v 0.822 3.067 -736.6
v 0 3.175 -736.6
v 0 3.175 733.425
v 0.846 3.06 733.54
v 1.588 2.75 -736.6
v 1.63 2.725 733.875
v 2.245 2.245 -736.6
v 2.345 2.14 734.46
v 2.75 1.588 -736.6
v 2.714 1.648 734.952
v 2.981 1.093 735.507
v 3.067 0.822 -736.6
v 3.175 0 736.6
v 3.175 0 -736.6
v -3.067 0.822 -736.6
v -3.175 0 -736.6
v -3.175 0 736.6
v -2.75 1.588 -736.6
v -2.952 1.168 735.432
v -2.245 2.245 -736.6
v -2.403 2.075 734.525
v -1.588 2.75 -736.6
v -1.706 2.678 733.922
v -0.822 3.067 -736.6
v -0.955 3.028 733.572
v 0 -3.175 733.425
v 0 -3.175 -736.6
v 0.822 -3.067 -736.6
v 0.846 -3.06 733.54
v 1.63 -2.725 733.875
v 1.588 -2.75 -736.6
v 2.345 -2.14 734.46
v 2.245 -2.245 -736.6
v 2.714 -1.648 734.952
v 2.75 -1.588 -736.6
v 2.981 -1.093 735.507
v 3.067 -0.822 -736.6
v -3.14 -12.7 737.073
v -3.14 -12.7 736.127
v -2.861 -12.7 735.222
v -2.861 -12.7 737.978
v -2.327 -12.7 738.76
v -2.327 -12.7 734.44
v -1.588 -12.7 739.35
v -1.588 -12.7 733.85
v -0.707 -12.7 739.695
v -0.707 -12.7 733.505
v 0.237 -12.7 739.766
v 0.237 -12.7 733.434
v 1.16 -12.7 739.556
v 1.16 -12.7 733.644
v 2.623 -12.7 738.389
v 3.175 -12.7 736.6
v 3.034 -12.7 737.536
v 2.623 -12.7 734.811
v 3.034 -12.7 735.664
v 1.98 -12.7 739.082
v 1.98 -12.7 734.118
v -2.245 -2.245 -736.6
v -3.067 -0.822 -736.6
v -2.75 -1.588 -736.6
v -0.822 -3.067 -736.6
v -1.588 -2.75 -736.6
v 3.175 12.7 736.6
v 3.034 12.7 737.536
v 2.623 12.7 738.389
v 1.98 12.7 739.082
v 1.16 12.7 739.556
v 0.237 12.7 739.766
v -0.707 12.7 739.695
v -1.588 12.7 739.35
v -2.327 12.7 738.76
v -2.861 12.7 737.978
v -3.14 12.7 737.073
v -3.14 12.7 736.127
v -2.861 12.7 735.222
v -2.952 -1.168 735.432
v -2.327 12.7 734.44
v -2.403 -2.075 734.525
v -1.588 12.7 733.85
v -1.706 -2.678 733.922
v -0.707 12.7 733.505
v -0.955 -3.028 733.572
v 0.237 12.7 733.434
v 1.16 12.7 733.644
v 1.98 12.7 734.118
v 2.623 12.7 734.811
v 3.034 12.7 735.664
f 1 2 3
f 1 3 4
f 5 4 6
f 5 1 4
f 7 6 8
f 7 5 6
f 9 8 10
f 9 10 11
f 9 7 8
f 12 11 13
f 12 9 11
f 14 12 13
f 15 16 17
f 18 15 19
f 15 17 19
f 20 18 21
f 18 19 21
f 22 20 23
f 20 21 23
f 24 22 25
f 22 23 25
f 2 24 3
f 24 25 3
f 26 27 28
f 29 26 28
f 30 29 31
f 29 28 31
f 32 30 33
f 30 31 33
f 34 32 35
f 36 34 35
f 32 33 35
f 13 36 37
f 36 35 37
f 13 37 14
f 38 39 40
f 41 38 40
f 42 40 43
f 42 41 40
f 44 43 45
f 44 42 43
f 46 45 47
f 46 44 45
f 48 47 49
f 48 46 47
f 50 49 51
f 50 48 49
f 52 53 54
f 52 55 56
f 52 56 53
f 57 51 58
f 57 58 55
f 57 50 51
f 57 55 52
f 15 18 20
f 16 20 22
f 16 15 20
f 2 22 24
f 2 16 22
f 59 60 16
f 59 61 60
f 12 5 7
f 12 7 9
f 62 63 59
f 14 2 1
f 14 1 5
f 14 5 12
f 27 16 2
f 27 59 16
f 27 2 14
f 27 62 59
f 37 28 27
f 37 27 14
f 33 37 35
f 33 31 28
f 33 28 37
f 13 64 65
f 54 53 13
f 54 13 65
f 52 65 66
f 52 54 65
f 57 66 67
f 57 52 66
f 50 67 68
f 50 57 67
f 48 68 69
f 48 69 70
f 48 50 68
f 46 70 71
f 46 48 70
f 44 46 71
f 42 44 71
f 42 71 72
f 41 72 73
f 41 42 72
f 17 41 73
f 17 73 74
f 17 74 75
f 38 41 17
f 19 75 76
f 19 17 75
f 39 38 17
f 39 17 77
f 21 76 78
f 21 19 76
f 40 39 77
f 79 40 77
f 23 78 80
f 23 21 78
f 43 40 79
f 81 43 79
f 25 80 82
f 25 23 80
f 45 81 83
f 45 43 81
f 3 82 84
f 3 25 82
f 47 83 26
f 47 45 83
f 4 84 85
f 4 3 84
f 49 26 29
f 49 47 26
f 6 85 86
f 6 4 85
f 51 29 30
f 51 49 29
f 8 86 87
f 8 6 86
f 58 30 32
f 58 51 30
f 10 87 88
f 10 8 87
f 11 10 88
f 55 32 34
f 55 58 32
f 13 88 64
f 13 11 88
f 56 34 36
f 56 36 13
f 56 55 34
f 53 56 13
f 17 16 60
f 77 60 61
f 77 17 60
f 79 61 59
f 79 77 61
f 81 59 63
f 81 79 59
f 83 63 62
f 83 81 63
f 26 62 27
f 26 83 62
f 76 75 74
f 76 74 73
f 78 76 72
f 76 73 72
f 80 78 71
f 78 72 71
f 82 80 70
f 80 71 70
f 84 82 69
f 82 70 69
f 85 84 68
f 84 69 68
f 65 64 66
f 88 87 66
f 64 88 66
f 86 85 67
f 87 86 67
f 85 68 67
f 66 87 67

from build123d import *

# Parameters (mm, degrees)
F0_W         = 6.35
F0_H         = 6.35
F0_H_2       = 1466.85
F1_DEPTH     = 3.175
F2_R         = 3.175
F3_DEPTH     = 12.7
F4_T3_DEPTH  = 1489.075
F4_S4_R      = 3.175
F4_T5_DEPTH  = 746
F4_T8_DEPTH  = 1489.075
F4_S9_R      = 3.175
F4_T10_DEPTH = 746
F4_T13_DEPTH = 1489.075
F4_S14_R     = 3.175
F4_T15_DEPTH = 746
F4_T18_DEPTH = 1489.075
F4_S19_R     = 3.175
F4_T20_DEPTH = 746


# Not quite as in the source:
# - a fillet or chamfer that OpenCascade refuses, or shapes differently, is made with other operations: its cross-section is extruded or revolved along the edge and cut away or added


with BuildPart() as f1:
    # F0 (on Front) → F1 (new body, symmetric)
    with BuildSketch(Plane.XZ):
        with Locations((0, 733.425)):
            Rectangle(F0_W, F0_H)
        with Locations((0, -3.175)):
            Rectangle(F0_W, F0_H_2)
    extrude(amount=F1_DEPTH, both=True)

    # F2 (on Front) → F3 (join, symmetric)
    with BuildSketch(Plane.XZ):
        with Locations((0, 736.6)):
            Circle(F2_R)
    extrude(amount=F3_DEPTH, both=True)

    # F4: fillet of radius 3.175 on 4 edges, made by hand


with BuildPart() as f4_tool1:
    # F4_s2 → F4_t3 (new body)
    with BuildSketch(Plane.XY.offset(-744.5375)):
        with BuildLine():
            ThreePointArc((0, -3.175), (2.2450640303, -2.2450640303), (3.175, 0))
            Line((3.175, 0), (3.175, -3.175))
            Line((3.175, -3.175), (0, -3.175))
        make_face()
    extrude(amount=F4_T3_DEPTH)

    # F4_s4 → F4_t5 (cut, symmetric)
    with BuildSketch(Plane.XZ.offset(1.6)):
        with Locations((0, 736.6)):
            Circle(F4_S4_R)
    extrude(amount=F4_T5_DEPTH, both=True, mode=Mode.SUBTRACT)


with BuildPart() as f4_tool6:
    # F4_s7 → F4_t8 (new body)
    with BuildSketch(Plane.XY.offset(-744.5375)):
        with BuildLine():
            ThreePointArc((0, 3.175), (2.2450640303, 2.2450640303), (3.175, 0))
            Line((3.175, 0), (3.175, 3.175))
            Line((3.175, 3.175), (0, 3.175))
        make_face()
    extrude(amount=F4_T8_DEPTH)

    # F4_s9 → F4_t10 (cut, symmetric)
    with BuildSketch(Plane.XZ.offset(-1.6)):
        with Locations((0, 736.6)):
            Circle(F4_S9_R)
    extrude(amount=F4_T10_DEPTH, both=True, mode=Mode.SUBTRACT)


with BuildPart() as f4_tool11:
    # F4_s12 → F4_t13 (new body)
    with BuildSketch(Plane.XY.offset(744.5375)):
        with BuildLine():
            ThreePointArc((-3.175, 0), (-2.2450640303, 2.2450640303), (0, 3.175))
            Line((0, 3.175), (-3.175, 3.175))
            Line((-3.175, 3.175), (-3.175, 0))
        make_face()
    extrude(amount=-F4_T13_DEPTH)

    # F4_s14 → F4_t15 (cut, symmetric)
    with BuildSketch(Plane.XZ.offset(-1.6)):
        with Locations((0, 736.6)):
            Circle(F4_S14_R)
    extrude(amount=F4_T15_DEPTH, both=True, mode=Mode.SUBTRACT)


with BuildPart() as f4_tool16:
    # F4_s17 → F4_t18 (new body)
    with BuildSketch(Plane.XY.offset(744.5375)):
        with BuildLine():
            ThreePointArc((-3.175, 0), (-2.2450640303, -2.2450640303), (0, -3.175))
            Line((0, -3.175), (-3.175, -3.175))
            Line((-3.175, -3.175), (-3.175, 0))
        make_face()
    extrude(amount=-F4_T18_DEPTH)

    # F4_s19 → F4_t20 (cut, symmetric)
    with BuildSketch(Plane.XZ.offset(1.6)):
        with Locations((0, 736.6)):
            Circle(F4_S19_R)
    extrude(amount=F4_T20_DEPTH, both=True, mode=Mode.SUBTRACT)


with BuildPart() as f1_1:
    add(f1.part)

    # F4_t21: cut F4_tool1, F4_tool6, F4_tool11, F4_tool16
    add([f4_tool1.part, f4_tool6.part, f4_tool11.part, f4_tool16.part], mode=Mode.SUBTRACT)


solid = f1_1.part
